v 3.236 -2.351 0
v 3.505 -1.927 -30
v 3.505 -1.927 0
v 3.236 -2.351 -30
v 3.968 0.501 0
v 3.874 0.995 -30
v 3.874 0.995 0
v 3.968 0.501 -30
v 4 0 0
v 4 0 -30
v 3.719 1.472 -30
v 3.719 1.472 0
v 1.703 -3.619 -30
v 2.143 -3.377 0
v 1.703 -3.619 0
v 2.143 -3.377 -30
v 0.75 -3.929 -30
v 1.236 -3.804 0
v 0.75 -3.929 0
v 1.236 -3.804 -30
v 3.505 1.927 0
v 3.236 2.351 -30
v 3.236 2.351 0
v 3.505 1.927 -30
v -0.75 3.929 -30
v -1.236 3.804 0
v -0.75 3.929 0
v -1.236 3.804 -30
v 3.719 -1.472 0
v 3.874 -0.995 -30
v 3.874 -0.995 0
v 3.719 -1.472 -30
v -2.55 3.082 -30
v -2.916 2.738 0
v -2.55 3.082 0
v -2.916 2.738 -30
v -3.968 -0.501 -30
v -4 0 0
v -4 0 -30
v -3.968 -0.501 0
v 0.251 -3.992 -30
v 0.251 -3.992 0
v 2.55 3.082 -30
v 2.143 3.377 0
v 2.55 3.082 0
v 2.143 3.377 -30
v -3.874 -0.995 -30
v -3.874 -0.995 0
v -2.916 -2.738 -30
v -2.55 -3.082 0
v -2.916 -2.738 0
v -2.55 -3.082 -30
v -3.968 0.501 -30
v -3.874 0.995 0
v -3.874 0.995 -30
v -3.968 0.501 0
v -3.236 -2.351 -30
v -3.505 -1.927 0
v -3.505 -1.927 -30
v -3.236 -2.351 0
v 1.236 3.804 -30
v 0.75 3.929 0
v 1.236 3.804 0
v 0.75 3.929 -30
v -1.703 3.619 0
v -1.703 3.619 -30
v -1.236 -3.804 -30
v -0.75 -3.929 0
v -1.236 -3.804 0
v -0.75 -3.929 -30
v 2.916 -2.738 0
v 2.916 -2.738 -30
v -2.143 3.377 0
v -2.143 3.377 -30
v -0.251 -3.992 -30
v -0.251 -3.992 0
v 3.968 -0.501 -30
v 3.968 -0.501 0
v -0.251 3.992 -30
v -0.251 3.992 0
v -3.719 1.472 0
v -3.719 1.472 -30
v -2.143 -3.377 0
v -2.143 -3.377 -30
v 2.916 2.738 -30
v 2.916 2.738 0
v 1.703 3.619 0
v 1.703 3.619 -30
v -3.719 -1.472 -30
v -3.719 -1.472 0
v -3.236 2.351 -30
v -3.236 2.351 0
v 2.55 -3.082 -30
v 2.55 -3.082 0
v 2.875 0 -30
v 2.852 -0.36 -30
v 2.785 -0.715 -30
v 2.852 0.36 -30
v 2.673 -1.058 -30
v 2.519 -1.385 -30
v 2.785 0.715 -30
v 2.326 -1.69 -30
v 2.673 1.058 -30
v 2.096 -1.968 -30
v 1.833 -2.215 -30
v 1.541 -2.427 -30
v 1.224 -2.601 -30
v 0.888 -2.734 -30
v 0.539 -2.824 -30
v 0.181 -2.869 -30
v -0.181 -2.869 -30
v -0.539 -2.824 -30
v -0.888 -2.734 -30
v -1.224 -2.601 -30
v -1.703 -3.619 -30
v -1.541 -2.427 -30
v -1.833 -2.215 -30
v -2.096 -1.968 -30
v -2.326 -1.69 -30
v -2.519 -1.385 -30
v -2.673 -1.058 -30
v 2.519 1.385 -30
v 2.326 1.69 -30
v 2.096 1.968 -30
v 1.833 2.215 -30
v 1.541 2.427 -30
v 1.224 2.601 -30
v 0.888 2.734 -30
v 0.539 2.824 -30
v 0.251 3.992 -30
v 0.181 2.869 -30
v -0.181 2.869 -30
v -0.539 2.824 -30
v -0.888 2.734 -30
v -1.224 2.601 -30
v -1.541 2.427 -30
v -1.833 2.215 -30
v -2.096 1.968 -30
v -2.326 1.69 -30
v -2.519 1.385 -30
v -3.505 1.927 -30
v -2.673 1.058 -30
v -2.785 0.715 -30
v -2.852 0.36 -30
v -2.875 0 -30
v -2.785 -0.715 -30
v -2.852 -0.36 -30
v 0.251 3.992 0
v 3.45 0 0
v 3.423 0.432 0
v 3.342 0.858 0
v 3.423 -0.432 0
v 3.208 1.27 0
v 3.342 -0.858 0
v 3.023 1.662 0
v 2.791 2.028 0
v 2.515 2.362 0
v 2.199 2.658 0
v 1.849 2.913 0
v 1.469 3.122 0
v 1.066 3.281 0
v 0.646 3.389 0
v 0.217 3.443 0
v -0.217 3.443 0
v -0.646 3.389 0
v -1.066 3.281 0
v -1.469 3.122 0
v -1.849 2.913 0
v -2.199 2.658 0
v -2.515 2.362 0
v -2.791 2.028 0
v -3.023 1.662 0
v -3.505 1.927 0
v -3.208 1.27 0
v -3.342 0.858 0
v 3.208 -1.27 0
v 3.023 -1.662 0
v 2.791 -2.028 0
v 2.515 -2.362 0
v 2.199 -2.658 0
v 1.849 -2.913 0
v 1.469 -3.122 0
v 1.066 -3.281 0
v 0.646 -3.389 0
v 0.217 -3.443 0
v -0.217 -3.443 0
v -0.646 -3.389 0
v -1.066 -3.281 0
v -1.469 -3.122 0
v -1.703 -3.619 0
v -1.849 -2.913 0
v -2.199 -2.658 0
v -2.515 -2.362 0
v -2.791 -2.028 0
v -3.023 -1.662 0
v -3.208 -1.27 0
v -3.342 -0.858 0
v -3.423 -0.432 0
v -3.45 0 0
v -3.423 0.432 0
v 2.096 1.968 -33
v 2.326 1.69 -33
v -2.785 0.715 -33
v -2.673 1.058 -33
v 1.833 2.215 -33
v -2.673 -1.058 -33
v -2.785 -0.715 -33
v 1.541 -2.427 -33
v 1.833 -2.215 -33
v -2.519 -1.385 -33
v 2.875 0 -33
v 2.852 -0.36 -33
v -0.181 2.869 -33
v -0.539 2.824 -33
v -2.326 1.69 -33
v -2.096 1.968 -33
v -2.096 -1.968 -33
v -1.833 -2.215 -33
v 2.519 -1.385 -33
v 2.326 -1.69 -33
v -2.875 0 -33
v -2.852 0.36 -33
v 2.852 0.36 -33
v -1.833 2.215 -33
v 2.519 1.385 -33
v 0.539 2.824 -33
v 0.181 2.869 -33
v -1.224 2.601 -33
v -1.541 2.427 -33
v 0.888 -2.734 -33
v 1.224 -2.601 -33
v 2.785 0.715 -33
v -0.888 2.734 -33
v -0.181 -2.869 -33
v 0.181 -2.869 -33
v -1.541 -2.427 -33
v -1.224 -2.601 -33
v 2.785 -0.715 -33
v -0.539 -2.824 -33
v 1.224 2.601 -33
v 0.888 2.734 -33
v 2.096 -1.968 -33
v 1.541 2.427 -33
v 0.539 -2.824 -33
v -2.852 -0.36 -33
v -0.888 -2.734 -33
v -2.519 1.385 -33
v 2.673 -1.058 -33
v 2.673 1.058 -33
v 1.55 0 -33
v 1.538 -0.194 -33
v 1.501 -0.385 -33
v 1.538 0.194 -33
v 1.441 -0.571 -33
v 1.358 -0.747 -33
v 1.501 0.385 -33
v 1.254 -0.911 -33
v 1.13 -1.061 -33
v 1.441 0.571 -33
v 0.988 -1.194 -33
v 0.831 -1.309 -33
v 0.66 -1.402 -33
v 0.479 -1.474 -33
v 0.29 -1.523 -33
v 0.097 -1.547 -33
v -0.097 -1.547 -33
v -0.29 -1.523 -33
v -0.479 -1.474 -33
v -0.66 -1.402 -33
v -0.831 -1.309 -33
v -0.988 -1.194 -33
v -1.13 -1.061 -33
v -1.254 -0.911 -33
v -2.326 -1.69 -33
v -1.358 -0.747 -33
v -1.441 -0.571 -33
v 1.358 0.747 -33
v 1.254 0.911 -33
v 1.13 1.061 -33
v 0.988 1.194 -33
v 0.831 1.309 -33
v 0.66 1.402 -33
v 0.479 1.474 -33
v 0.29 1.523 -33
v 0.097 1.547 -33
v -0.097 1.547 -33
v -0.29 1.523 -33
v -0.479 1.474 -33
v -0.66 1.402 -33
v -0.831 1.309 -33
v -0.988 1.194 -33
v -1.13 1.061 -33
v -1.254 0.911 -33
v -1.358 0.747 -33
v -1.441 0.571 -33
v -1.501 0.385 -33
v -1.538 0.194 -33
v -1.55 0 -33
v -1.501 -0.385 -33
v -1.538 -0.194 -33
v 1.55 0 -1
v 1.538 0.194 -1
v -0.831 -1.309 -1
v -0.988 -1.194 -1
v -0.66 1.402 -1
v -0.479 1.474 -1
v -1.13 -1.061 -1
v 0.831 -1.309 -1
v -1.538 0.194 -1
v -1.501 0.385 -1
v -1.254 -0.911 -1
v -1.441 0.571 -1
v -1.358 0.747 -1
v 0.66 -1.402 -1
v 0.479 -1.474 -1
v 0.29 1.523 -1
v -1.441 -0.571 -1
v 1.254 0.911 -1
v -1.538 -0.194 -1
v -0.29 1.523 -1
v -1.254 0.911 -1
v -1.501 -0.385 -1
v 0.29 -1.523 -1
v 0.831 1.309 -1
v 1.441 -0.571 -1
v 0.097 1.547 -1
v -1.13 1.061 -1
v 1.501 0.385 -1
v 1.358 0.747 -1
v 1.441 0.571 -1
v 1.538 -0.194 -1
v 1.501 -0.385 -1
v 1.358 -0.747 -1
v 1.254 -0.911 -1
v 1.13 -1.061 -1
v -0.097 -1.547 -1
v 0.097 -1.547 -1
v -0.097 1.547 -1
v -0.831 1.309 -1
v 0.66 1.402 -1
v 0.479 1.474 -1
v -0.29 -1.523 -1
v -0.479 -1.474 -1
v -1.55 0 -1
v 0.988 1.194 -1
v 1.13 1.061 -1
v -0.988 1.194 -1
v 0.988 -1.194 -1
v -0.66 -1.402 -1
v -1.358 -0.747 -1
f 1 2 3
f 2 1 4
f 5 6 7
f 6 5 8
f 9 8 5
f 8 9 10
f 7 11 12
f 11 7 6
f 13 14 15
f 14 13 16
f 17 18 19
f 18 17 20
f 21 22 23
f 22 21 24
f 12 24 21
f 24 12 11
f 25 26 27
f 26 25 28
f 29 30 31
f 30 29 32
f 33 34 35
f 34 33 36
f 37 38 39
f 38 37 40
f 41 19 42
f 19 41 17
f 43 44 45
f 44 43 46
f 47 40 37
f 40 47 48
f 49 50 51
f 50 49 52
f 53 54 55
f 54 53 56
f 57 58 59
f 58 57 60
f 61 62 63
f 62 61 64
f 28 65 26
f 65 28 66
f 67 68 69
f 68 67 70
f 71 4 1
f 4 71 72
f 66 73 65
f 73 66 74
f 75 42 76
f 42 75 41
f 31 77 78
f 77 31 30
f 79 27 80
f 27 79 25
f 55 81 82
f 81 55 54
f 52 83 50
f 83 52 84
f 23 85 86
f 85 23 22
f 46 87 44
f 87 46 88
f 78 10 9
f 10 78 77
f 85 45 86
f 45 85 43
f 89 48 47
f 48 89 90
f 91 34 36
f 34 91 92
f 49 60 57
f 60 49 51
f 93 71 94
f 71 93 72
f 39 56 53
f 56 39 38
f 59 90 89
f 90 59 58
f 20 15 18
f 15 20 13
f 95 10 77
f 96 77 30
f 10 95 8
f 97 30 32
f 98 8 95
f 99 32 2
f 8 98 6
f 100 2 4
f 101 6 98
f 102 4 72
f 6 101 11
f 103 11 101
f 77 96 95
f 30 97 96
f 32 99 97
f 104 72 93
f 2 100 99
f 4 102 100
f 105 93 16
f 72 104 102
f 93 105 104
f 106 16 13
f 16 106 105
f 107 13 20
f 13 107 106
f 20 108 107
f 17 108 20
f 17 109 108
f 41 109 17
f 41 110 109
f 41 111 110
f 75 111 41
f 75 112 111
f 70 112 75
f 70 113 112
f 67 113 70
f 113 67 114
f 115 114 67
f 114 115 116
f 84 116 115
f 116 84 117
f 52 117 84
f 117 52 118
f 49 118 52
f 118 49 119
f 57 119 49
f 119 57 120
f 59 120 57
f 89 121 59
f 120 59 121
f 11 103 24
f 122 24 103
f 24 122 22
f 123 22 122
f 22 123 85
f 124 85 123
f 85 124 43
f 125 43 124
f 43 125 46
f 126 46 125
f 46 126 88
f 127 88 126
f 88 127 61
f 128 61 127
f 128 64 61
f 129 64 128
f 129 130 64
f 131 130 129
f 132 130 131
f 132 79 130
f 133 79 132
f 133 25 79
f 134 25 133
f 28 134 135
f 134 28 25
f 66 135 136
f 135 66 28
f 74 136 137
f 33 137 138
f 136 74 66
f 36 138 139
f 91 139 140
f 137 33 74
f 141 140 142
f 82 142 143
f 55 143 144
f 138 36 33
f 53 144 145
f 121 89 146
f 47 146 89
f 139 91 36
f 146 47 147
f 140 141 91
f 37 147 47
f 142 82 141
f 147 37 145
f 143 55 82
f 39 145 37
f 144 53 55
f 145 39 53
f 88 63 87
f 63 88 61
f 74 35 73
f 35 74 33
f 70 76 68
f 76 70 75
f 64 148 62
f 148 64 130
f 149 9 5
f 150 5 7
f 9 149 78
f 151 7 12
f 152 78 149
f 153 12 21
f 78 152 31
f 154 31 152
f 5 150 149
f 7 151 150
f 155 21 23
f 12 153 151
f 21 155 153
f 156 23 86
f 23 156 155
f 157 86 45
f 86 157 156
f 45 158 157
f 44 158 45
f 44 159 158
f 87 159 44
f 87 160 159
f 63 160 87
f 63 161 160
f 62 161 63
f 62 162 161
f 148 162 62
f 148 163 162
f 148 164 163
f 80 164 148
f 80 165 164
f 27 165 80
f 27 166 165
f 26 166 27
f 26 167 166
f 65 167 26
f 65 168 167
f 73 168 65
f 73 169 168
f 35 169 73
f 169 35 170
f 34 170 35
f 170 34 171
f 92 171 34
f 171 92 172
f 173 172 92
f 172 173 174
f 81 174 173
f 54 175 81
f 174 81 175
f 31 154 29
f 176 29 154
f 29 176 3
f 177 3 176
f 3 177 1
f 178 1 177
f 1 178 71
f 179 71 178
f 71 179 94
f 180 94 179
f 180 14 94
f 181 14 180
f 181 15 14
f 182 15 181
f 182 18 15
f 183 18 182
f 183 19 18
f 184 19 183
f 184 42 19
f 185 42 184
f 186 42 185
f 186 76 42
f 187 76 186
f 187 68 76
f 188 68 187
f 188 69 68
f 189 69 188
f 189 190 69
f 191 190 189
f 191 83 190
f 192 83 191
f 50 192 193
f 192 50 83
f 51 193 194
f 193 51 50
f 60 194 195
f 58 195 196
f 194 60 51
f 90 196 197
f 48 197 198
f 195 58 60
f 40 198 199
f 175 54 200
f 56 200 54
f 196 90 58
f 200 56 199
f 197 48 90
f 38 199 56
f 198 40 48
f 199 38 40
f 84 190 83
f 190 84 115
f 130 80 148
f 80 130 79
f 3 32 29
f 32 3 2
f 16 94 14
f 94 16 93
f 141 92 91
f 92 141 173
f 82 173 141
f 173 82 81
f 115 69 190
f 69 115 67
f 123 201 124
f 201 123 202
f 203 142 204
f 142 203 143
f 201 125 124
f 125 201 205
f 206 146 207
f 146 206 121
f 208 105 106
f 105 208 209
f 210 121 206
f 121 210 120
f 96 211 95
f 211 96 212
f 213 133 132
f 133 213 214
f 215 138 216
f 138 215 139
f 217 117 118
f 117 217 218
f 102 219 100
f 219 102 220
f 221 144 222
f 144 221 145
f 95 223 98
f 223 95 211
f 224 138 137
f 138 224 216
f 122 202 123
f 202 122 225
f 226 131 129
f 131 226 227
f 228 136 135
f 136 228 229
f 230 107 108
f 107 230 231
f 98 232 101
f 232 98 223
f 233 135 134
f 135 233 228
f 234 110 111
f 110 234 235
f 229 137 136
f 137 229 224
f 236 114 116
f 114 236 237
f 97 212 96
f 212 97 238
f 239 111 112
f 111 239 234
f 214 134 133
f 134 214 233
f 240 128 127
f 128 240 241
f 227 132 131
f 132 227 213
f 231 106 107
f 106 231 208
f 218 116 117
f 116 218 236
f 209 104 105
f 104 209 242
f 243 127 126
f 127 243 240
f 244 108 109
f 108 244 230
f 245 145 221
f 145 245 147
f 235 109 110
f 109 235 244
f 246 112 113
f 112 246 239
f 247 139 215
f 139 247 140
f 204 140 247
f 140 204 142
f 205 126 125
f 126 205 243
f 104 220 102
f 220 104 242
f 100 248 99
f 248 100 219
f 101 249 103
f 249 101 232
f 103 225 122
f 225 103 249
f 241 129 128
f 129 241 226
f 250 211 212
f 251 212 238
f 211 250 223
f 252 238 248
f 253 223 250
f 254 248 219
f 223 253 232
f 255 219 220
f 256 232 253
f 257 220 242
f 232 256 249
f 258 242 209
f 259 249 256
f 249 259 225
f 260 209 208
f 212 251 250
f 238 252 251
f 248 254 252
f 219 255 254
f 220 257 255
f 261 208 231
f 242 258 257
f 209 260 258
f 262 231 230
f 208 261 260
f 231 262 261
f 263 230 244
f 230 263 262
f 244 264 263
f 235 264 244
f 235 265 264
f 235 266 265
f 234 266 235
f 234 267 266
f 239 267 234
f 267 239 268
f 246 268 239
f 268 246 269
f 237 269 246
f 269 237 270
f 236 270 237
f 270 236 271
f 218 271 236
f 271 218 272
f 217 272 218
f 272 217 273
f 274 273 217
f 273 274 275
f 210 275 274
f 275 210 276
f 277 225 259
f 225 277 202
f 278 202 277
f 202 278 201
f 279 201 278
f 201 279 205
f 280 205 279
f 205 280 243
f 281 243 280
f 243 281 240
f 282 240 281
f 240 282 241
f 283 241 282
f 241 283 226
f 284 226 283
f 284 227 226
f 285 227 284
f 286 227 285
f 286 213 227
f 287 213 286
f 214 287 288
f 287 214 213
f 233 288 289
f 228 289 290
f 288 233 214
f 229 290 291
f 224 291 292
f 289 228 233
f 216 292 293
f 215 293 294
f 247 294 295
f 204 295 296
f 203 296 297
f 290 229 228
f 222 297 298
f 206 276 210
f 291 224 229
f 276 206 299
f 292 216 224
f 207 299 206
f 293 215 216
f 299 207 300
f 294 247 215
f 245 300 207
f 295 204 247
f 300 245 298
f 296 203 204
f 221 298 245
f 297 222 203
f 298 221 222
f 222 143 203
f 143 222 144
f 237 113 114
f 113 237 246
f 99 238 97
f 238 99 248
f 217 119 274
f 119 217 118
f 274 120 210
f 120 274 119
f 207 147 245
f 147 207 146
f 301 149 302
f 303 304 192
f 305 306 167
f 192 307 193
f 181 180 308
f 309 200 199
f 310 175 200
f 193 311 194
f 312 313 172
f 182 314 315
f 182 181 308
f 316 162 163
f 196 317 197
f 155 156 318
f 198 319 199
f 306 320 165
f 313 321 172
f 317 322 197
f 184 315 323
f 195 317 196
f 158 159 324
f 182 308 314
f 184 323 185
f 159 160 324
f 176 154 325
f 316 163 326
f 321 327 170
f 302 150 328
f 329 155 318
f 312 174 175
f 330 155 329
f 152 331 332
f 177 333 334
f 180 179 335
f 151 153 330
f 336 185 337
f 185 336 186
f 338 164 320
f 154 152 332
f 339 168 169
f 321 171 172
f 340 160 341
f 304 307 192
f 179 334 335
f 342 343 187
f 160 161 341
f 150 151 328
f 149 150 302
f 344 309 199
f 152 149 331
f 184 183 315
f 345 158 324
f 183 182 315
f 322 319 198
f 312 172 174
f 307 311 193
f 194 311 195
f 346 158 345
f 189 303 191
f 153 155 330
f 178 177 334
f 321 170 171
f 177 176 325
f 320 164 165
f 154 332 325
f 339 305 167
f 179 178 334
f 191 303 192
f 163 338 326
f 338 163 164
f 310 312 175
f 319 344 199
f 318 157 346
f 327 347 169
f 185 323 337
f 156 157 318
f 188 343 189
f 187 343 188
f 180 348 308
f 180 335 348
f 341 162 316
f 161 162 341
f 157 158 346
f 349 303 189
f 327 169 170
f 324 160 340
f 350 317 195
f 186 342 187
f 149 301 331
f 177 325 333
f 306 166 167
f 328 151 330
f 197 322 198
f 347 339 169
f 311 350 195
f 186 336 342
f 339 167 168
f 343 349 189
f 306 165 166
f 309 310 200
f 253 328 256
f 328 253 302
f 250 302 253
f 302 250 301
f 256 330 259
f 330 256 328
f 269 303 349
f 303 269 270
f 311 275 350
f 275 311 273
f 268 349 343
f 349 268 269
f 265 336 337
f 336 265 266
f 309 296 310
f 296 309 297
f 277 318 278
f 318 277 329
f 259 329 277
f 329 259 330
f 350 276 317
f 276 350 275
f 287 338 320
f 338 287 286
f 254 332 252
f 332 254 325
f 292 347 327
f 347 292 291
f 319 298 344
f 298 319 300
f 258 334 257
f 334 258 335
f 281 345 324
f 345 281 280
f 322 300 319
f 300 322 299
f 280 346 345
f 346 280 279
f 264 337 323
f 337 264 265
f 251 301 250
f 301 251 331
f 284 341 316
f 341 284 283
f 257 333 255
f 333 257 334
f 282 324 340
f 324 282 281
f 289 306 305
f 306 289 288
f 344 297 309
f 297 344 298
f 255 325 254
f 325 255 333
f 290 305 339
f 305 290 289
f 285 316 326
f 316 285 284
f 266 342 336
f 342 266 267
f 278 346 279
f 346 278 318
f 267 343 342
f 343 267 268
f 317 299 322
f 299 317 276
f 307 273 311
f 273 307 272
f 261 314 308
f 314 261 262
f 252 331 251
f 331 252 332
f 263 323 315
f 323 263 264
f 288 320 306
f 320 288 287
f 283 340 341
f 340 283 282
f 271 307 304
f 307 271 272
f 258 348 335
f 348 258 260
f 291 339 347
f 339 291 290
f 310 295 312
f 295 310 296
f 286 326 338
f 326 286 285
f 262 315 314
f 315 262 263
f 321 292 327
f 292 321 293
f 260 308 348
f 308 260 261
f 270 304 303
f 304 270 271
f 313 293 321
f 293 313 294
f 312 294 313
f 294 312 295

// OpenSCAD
$fn = 50;

difference() {
	union() {
		translate(v = [0, 0, -30.0]) {
			cylinder(h = 30, r = 4.0);
		}
		#translate(v = [0, 0, -33.0]) {
			cylinder(h = 33, r = 2.875);
		}
	}
	union() {
		translate(v = [0, 0, 0]) {
			rotate(a = [0, 0, 0]) {
				difference() {
					union() {
						translate(v = [0, 0, -33.0]) {
							cylinder(h = 33, r = 1.25);
						}
						translate(v = [0, 0, -1.0]) {
							cylinder(h = 1.0, r1 = 1.55, r2 = 3.45);
						}
						translate(v = [0, 0, -33.0]) {
							cylinder(h = 33, r = 1.55);
						}
						translate(v = [0, 0, -33.0]) {
							cylinder(h = 33, r = 1.25);
						}
					}
					union();
				}
			}
		}
	}
}
